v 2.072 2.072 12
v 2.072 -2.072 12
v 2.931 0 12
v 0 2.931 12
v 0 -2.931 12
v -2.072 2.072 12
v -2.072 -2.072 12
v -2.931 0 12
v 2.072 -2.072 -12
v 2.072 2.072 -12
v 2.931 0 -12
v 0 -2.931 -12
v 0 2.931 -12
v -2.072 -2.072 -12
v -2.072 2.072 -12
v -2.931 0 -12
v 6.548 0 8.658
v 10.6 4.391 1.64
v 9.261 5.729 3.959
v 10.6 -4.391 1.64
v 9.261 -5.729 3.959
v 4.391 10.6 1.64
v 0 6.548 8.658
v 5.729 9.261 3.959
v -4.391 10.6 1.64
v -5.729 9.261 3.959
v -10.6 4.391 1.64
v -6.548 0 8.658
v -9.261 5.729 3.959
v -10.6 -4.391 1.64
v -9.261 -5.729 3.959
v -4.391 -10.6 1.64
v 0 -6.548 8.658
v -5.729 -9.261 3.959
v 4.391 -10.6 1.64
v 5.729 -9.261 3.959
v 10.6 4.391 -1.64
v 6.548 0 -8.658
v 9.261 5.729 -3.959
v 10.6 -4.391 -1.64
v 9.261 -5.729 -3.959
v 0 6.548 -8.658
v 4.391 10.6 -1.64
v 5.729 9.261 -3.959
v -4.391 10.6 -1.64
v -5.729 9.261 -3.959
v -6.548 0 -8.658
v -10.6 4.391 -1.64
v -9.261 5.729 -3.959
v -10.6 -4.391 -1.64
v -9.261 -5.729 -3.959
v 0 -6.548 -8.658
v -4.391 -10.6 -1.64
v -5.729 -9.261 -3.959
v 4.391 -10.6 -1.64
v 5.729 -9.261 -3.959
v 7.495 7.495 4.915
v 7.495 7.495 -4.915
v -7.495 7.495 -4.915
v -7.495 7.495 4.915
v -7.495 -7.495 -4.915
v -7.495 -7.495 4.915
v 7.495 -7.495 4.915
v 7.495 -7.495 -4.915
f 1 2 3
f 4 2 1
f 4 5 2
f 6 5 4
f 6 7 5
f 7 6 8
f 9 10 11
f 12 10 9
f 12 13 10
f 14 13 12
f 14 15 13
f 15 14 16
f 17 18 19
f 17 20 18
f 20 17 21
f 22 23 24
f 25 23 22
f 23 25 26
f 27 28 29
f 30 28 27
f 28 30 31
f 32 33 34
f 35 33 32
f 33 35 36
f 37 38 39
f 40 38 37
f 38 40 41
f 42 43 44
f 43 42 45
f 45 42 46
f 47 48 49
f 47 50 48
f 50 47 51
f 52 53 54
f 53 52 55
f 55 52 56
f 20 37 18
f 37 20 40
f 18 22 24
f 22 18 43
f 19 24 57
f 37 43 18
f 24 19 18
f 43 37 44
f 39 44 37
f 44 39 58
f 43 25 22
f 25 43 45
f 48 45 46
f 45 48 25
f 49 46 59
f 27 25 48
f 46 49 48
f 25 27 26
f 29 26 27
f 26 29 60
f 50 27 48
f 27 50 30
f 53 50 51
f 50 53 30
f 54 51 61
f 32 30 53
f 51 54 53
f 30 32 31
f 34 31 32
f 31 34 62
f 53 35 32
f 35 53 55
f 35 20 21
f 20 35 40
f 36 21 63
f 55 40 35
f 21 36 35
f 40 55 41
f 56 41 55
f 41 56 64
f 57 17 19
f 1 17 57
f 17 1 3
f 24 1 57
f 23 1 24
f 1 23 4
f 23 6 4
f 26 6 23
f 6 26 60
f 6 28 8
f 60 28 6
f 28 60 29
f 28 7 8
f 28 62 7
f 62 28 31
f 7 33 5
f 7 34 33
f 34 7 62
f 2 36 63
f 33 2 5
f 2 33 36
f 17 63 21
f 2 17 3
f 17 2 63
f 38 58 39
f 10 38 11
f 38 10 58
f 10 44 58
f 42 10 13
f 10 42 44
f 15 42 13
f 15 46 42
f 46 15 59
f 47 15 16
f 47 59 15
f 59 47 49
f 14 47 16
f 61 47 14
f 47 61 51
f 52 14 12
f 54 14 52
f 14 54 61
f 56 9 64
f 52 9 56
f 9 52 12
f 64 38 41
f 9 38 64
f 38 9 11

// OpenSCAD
/*
  create a gem using faceting instructions 
  see http://kitwallace.tumblr.com/tagged/gem
  Kit Wallace 
*/

function make_facets(start,increment,limit,axial_angle,height,name) =
    start <= limit
      ? concat([[start/limit*360, axial_angle, height,name]] ,
               make_facets(start+increment,increment,limit,axial_angle,height,name))
      : [] ;

function make_facets_rev(start,increment,limit,axial_angle,height,name) =
    start <= limit
      ? concat([[(180 + start/limit*360) % 360, axial_angle+180, height,name]] ,
               make_facets_rev(start+increment,increment,limit,axial_angle,height,name))
      : [] ;

function make_facets_list_r(indexes,i,limit, axial_angle, height,name) =
    i >= 0
      ? concat ([[indexes[i]/limit * 360,axial_angle,height,name,indexes[i]]],
             make_facets_list_r(indexes, i - 1, limit,axial_angle, height,name))
      : [];

function make_facets_list(indexes,limit, axial_angle, height,name) =
    make_facets_list_r(indexes,len(indexes)-1,limit,axial_angle,height,name);


function make_facets_list_rev_r(indexes,i,limit, axial_angle, height,name) =
    i >= 0
      ? concat ([[(180 + indexes[i]/limit * 360) % 360,axial_angle+180,height,name,indexes[i]]],
             make_facets_list_rev_r(indexes, i - 1, limit,axial_angle, height,name))
      : [];

function make_facets_list_rev(indexes,limit, axial_angle, height,name) =
    make_facets_list_rev_r(indexes,len(indexes)-1,limit,axial_angle,height,name);

function make_table(height) = [[0,0,height,"table"]];
function make_culet(height) = [[0,180,height,"culet"]];

module body(Size=70) {
    cube(Size,center=true);
}

module cut_facet_data(index_angle,axial_angle,height,Width=200,Depth=50) {
     rotate([0,0,index_angle])
        rotate([0,axial_angle,0])
           translate([0,0,Depth/2 + height])
              cube([Width,Width,Depth],center=true);
}

module cut_facets(facets, n) {
   for (i =[0:n-1]) 
       cut_facet(facets[i]);
}

module cut_facet(facet) {
   cut_facet_data(facet[0],facet[1],facet[2]);
}

function facets_to(facets,name,i=0,start=0) =
    facets[i][3]==name
       ? concat([facets[i]], facets_to(facets,name,i+1,1))
       : start == 0 && i < len(facets)
           ? concat([facets[i]], facets_to(facets,name,i+1,0))
           : []
    ;

module gem_n(facets,n) {
   difference() {
      if (n==1) body(); else gem_n(facets,n-1);
      cut_facet(facets[n-1]);
   }
}

module gem(facets) {
   gem_n(facets,len(facets));
}

function gem_facets() =
 concat( 
    make_table(12)                   
   ,make_culet(12)                   
   ,make_facets(0,24,96,60,10,"C1")       
   ,make_facets_rev(0,24,96,60,10,"P1")  
   ,make_facets(0,12,96,90,10.6,"G2")       
   ,make_facets(12,24,96,51,11.5,"C2")       
   ,make_facets_rev(12,24,96,51,11.5,"P2")       
   ,make_facets(6,12,96,45,10.4,"C3")
   ,make_facets_rev(6,12,96,45,10.4,"P3")
       
   ); 

facets = gem_facets();
sfacets = facets_to(facets,"P3");
echo(sfacets);
gem(sfacets);
